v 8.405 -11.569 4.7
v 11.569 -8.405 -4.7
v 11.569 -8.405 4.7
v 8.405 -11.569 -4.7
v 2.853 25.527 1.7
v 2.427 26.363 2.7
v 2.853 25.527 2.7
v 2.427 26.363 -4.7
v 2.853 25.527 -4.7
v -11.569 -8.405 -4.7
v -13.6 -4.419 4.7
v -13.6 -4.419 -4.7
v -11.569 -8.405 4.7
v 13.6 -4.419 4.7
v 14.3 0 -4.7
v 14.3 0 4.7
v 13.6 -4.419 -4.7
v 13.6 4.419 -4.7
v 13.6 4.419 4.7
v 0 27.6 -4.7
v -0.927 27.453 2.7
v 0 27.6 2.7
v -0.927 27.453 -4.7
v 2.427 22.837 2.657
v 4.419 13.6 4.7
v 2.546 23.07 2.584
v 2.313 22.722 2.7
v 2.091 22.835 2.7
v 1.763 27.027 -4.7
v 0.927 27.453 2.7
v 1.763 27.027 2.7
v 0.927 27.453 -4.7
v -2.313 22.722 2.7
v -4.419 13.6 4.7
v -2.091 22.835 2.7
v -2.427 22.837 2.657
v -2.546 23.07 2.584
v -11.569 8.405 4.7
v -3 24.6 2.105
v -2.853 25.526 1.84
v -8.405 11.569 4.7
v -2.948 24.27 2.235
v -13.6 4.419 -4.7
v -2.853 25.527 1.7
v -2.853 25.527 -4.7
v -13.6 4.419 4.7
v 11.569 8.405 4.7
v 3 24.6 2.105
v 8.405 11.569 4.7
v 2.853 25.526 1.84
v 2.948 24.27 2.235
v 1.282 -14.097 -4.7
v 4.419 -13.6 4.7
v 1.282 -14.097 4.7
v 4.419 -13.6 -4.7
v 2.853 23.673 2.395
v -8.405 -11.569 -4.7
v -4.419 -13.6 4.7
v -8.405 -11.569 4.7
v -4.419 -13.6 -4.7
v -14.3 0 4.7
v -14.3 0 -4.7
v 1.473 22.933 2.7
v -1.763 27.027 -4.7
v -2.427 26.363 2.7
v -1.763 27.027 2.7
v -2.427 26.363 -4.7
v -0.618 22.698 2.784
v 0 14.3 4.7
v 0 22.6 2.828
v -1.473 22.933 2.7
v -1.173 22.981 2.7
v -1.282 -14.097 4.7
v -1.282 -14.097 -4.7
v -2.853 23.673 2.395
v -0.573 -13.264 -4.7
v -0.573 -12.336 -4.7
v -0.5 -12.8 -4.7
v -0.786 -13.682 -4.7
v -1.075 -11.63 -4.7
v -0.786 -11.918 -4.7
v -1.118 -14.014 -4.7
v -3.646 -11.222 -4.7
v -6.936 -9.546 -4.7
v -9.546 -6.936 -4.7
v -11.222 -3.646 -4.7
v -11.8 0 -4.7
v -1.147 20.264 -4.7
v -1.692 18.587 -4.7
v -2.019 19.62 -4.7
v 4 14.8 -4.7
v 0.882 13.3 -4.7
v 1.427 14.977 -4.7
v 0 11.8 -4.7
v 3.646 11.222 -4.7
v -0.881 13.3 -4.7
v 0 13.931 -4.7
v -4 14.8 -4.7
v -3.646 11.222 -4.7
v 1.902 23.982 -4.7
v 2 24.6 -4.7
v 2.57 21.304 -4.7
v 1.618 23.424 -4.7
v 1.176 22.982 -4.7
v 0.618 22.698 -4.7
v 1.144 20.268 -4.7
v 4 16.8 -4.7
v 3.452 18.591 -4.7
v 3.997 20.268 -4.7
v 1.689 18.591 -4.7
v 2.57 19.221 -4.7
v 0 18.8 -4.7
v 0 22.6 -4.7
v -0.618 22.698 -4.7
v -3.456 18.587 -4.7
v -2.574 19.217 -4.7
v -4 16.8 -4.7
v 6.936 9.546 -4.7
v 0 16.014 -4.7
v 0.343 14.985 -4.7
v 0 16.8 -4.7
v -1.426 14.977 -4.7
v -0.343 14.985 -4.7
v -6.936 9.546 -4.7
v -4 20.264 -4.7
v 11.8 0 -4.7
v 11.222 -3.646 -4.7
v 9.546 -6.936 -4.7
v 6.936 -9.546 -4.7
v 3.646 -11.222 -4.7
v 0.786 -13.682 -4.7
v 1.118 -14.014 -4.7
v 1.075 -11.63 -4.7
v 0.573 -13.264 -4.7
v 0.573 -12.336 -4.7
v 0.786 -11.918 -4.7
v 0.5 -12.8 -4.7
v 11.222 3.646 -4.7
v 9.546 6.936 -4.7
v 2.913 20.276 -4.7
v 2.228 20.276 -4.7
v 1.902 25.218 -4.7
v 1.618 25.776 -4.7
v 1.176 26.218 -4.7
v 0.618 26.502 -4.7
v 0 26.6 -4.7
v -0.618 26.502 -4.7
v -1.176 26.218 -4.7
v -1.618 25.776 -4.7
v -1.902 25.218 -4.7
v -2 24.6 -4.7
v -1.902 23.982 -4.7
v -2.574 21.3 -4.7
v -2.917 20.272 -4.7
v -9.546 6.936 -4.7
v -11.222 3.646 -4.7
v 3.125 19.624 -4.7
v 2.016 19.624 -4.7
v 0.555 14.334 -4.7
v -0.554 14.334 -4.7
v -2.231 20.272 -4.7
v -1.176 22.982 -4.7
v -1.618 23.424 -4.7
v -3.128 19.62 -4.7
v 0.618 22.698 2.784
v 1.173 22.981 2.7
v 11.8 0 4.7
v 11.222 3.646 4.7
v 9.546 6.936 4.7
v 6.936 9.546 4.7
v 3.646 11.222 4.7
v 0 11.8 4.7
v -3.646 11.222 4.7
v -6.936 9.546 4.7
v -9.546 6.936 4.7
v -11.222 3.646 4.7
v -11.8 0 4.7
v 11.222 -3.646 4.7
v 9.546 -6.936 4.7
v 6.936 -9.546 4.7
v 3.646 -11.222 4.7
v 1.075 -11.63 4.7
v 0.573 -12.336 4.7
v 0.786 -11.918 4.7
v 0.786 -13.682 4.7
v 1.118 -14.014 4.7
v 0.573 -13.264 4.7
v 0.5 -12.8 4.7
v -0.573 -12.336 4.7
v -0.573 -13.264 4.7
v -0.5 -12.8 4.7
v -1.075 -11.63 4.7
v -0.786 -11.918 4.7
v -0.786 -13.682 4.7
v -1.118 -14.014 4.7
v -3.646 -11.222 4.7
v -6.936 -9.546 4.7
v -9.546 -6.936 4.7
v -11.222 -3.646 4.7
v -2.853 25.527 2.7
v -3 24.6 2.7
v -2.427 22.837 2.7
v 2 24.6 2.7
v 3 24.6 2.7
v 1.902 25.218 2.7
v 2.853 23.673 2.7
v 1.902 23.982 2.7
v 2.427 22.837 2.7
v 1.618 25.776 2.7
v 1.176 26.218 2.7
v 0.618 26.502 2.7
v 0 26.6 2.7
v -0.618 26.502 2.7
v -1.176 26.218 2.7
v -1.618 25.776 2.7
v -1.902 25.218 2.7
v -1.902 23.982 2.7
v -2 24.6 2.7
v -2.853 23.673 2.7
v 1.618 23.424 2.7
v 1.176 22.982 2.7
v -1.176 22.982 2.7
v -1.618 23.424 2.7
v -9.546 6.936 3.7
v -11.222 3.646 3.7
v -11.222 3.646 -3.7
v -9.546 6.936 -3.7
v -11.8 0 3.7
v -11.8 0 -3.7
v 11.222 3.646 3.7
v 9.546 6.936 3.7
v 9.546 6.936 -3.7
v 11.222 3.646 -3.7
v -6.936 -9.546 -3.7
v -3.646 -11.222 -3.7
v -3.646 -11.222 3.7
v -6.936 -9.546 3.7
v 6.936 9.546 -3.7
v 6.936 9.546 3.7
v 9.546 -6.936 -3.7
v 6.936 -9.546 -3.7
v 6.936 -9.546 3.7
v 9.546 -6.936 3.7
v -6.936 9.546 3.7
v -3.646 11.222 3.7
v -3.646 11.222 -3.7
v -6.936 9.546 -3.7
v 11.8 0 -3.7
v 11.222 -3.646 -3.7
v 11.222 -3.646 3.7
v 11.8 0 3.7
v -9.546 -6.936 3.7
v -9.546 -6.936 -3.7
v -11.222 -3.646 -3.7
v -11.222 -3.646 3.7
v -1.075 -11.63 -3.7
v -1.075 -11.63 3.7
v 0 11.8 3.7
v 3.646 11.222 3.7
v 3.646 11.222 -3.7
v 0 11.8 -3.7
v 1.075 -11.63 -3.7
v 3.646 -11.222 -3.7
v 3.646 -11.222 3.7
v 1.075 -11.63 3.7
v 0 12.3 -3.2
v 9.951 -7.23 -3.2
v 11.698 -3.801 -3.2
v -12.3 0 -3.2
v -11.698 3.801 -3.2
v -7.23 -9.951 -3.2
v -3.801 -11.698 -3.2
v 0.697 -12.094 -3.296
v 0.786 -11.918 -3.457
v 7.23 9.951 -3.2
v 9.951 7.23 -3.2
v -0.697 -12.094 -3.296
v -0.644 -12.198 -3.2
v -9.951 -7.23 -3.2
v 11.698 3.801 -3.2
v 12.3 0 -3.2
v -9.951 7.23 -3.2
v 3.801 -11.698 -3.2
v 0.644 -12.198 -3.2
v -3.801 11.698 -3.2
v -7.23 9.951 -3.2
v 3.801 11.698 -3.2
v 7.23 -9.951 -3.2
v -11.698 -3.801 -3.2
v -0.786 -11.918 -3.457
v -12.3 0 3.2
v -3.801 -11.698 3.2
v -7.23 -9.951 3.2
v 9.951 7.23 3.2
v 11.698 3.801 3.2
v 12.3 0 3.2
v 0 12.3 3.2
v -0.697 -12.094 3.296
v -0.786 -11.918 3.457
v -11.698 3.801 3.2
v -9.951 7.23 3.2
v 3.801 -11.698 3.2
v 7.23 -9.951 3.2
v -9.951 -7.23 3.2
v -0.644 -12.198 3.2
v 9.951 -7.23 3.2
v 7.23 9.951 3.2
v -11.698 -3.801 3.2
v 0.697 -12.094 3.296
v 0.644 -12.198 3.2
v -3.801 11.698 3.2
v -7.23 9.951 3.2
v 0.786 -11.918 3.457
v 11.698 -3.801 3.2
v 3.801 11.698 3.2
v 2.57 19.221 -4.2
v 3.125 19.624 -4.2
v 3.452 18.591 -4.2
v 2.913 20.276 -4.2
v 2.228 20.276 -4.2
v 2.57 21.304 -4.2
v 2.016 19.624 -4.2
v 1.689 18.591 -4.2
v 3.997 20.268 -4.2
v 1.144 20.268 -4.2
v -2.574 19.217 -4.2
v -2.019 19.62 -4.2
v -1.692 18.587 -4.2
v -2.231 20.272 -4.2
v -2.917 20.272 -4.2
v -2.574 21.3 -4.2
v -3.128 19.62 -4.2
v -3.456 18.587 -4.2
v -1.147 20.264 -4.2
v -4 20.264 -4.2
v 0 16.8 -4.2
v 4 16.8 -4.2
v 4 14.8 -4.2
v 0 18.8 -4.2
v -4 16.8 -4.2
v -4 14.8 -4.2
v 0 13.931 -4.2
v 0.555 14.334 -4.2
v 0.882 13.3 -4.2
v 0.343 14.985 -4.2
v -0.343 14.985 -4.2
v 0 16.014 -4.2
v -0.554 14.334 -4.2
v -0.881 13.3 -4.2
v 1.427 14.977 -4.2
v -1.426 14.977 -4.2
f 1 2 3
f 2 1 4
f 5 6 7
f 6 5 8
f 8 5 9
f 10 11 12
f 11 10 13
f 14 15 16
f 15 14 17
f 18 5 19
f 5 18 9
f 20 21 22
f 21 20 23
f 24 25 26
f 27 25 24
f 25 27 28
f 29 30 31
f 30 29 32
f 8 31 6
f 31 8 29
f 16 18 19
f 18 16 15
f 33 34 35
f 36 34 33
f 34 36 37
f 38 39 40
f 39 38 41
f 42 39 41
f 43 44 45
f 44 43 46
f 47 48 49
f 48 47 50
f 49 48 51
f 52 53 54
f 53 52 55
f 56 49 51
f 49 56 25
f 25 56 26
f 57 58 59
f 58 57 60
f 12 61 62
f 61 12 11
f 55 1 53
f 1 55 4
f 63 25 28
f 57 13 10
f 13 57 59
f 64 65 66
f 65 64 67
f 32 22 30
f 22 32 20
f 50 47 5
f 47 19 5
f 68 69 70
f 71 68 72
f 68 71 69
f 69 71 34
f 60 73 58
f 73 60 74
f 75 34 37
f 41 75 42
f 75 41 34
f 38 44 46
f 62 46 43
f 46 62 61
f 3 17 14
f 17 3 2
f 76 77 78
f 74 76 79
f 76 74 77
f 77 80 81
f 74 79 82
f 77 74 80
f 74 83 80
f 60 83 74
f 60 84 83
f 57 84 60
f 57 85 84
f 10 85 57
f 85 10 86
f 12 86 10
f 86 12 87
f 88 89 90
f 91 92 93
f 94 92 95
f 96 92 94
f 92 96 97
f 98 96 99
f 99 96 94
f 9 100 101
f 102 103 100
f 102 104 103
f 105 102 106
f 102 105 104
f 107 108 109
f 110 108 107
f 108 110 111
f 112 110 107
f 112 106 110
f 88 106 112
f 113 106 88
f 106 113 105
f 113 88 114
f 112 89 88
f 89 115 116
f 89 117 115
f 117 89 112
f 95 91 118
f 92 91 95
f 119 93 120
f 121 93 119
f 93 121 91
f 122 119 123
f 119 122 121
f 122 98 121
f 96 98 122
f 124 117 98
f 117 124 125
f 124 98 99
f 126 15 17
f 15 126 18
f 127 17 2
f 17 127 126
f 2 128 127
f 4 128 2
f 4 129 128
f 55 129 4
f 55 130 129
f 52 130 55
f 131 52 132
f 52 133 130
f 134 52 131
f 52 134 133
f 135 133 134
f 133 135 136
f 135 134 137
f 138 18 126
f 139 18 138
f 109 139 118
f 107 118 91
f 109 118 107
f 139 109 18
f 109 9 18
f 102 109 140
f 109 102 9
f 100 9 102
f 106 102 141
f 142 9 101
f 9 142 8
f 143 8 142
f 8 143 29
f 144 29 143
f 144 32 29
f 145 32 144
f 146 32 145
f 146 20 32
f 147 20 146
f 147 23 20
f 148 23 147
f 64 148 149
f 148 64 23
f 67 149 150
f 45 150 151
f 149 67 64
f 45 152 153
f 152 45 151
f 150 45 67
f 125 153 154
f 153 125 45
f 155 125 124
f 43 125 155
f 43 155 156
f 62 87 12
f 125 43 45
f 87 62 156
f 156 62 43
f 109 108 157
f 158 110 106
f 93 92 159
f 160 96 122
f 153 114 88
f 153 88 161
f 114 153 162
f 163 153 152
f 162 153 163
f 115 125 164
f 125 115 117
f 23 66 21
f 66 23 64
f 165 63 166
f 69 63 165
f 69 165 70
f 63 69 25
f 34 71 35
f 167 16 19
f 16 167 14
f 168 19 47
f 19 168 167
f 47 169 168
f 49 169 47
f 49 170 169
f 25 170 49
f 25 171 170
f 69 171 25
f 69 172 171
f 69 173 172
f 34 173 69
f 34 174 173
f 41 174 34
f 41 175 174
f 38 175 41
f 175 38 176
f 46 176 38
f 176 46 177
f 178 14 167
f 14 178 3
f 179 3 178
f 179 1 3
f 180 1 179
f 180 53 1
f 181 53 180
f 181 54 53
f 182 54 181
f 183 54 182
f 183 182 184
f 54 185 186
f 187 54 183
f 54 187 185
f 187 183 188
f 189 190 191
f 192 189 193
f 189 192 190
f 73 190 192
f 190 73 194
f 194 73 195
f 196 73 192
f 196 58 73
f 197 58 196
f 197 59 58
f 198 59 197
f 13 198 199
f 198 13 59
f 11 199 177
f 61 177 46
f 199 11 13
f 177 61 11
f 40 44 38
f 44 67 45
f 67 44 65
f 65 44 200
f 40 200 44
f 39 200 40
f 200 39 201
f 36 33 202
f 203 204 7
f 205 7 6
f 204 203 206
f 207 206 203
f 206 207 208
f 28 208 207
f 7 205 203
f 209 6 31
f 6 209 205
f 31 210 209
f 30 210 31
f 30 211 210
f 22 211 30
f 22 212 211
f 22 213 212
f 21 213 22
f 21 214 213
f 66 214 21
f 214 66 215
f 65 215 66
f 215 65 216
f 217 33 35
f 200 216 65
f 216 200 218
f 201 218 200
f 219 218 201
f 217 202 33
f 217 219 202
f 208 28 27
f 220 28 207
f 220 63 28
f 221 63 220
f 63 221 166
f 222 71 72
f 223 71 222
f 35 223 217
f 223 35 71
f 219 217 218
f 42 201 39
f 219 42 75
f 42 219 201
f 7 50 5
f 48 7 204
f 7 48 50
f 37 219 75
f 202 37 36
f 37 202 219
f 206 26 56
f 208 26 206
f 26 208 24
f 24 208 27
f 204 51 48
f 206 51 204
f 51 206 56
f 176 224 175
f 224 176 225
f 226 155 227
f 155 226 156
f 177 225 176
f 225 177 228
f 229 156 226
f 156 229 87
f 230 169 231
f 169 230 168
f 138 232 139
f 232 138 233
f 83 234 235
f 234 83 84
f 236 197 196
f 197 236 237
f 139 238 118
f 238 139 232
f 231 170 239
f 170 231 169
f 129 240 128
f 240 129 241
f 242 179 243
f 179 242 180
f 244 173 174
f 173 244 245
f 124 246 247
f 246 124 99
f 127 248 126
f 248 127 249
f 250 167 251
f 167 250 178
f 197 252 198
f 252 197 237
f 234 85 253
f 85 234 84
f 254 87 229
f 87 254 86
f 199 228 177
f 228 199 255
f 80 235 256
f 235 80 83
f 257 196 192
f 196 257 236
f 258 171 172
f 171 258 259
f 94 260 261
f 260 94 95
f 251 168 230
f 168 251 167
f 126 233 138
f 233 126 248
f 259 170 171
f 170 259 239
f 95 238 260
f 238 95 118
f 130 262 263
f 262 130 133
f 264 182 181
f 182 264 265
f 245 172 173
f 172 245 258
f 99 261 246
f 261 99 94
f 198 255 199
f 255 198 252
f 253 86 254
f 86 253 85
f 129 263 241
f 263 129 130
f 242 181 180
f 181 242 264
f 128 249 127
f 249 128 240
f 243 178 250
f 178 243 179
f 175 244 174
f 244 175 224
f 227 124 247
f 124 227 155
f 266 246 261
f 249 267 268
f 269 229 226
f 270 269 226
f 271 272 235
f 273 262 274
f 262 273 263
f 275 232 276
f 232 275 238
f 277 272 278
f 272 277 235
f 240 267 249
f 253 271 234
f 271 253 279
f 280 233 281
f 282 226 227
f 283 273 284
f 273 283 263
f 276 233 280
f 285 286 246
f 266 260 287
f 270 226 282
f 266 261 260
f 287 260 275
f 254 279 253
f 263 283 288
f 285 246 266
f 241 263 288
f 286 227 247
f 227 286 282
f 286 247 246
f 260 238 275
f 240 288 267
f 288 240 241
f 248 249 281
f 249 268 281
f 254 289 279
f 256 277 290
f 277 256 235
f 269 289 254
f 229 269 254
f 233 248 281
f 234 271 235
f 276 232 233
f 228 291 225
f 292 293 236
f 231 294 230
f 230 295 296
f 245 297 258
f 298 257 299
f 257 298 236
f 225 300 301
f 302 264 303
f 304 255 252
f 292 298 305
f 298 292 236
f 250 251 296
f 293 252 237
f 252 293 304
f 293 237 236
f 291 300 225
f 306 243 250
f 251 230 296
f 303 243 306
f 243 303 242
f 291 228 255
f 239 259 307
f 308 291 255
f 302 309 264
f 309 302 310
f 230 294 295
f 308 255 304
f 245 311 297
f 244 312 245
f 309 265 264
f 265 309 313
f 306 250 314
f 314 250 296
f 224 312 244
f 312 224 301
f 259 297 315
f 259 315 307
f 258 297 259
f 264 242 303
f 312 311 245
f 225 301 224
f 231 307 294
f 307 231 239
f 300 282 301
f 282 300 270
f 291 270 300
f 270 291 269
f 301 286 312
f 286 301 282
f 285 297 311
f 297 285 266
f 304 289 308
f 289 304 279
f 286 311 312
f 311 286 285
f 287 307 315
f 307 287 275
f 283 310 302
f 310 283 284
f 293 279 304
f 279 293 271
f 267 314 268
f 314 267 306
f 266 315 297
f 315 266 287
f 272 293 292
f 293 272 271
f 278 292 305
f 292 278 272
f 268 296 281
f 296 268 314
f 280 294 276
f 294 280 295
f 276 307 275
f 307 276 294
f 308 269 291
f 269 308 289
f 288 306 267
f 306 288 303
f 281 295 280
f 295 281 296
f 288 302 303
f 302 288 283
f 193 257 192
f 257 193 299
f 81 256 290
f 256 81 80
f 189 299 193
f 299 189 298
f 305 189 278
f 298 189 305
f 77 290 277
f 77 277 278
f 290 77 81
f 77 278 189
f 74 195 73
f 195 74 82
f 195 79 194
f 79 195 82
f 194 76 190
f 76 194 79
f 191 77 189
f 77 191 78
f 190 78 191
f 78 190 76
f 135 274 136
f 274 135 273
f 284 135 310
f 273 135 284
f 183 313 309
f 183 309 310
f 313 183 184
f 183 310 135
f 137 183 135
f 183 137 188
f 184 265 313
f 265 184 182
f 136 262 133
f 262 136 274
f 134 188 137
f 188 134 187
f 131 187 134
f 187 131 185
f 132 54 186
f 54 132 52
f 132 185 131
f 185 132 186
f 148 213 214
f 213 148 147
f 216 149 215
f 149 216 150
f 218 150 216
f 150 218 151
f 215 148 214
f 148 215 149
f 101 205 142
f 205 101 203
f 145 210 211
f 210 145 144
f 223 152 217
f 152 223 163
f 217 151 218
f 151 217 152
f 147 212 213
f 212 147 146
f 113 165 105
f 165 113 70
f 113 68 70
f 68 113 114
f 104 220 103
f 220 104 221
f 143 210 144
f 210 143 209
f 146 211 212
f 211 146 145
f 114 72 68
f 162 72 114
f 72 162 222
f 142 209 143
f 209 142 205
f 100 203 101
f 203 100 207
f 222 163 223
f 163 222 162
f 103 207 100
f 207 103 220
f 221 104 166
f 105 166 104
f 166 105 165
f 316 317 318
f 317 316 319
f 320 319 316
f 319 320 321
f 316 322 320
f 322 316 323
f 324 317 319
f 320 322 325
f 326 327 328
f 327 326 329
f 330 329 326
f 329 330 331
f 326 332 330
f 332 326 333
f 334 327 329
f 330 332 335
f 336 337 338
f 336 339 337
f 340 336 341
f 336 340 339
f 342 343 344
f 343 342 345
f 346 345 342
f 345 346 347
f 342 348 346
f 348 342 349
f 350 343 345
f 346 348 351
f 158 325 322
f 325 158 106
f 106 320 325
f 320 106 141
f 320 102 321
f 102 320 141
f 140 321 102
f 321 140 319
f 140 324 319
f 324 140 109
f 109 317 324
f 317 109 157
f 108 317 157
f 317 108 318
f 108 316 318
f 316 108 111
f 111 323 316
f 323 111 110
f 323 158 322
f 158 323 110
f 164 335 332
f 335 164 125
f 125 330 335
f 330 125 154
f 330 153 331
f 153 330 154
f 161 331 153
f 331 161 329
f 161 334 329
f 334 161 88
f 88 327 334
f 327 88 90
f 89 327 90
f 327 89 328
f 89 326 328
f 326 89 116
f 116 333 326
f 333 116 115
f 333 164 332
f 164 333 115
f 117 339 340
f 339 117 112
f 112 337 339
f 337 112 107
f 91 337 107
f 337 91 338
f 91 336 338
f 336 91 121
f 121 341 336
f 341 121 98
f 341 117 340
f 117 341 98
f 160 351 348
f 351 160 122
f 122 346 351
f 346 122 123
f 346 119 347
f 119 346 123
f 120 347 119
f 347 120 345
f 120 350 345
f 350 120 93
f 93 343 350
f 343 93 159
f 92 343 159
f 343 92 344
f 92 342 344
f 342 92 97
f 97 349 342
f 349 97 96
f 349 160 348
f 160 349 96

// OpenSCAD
CoinDiameter=24.6; // US Quarter Dollar
CoinThickness=3.7/2; // US Quarter Dollar
CoinQty=4;
HangerHoleDiameter=4;
ApertureDiameter=CoinDiameter-1;
SideMount=0;
LogoSize=10;
$fn=20;

CoinHeight=CoinThickness*CoinQty;

module CC_Tag(Size=10,Thickness=1, Center=true, DoBorder=true){
 linear_extrude(height=Thickness,center=Center)
 scale([2.54/90*Size/10, -2.54/90*Size/10, 1]) union() {
  polygon([[-0.006525,-53.156145],[-141.738804,17.709995],[-141.738804,88.576135],[-0.006525,17.709995],[141.725765,88.576135],[141.725765,17.709995]]); // Chevron
  polygon([[-0.006525,45.577248],[12.137625,82.011868],[50.541755,82.302728],[19.643125,105.111418],[31.234025,141.725798],[-0.006535,119.387728],[-31.247095,141.725798],[-19.656185,105.111418],[-50.554815,82.302728],[-12.150685,82.011868]]); //Bottom star
 polygon([[91.200672,-141.742850],[103.344822,-105.308230],[141.748952,-105.017370],[110.850322,-82.208680],[122.441222,-45.594300],[91.200662,-67.932370],[59.960102,-45.594300],[71.551012,-82.208680],[40.652382,-105.017370],[79.056512,-105.308230]]);
 polygon([[-91.078056,-141.883062],[-78.933906,-105.448442],[-40.529776,-105.157582],[-71.428406,-82.348892],[-59.837506,-45.734512],[-91.078066,-68.072582],[-122.318626,-45.734512],[-110.727716,-82.348892],[-141.626346,-105.157582],[-103.222216,-105.448442]]);
 if (DoBorder)
 difference(){
  polygon([[-177.171875,-177.171875],[-177.171875,177.171875],[177.171875,177.171875],[177.171875,-177.171875],[-177.171875,-177.171875]]);
  polygon([[-159.453125,-159.453125],[159.453125,-159.453125],[159.453125,159.453125],[-159.453125,159.453125],[-159.453125,-159.453125]]);
  }
 }
}

rotate([0,180,0])
difference(){
 union() {
  hull(){
   cylinder(r=(CoinDiameter/2)+2,h=CoinHeight+2,center=true);
   translate([0,CoinDiameter,1.5*(1-SideMount)]) rotate([0,90*SideMount,0]) cylinder(r=(HangerHoleDiameter/2)+1,h=CoinHeight-1,center=true);
  }
  translate([0,CoinDiameter,1*(1-SideMount)]) rotate([0,90*SideMount,0]) cylinder(r=(HangerHoleDiameter/2)+1,h=CoinHeight,center=true);
 }

 translate([0,0,0])
 union(){
  color("red") cylinder(r=ApertureDiameter/2,h=CoinHeight+10, center=true);
  color("red") translate([0,0,CoinHeight/2-0.5]) cylinder(r1=CoinDiameter/2,r2=ApertureDiameter/2,h=0.5);
  color("red") translate([0,0,-CoinHeight/2]) cylinder(r2=CoinDiameter/2,r1=ApertureDiameter/2,h=0.5);
  color("red") cylinder(r=CoinDiameter/2, h=CoinHeight-1, center=true);
 }
 color("red") translate([0,CoinDiameter,0]) rotate([0,90*SideMount,0]) cylinder(r=HangerHoleDiameter/2,h=CoinHeight+10,center=true);
 translate([0,-CoinDiameter/2-0.5,0])
 difference(){
  color("red") cube([4,3,CoinHeight+10],center=true);
  color("blue") translate([2,0,0]) cylinder(r=1.5,h=CoinHeight+11,center=true);
  color("blue") translate([-2,0,0]) cylinder(r=1.5,h=CoinHeight+11,center=true);
 }

translate([0,CoinDiameter/2+LogoSize/2,CoinHeight/2+1]) CC_Tag(Size=LogoSize,center=true,DoBorder=false);
}
